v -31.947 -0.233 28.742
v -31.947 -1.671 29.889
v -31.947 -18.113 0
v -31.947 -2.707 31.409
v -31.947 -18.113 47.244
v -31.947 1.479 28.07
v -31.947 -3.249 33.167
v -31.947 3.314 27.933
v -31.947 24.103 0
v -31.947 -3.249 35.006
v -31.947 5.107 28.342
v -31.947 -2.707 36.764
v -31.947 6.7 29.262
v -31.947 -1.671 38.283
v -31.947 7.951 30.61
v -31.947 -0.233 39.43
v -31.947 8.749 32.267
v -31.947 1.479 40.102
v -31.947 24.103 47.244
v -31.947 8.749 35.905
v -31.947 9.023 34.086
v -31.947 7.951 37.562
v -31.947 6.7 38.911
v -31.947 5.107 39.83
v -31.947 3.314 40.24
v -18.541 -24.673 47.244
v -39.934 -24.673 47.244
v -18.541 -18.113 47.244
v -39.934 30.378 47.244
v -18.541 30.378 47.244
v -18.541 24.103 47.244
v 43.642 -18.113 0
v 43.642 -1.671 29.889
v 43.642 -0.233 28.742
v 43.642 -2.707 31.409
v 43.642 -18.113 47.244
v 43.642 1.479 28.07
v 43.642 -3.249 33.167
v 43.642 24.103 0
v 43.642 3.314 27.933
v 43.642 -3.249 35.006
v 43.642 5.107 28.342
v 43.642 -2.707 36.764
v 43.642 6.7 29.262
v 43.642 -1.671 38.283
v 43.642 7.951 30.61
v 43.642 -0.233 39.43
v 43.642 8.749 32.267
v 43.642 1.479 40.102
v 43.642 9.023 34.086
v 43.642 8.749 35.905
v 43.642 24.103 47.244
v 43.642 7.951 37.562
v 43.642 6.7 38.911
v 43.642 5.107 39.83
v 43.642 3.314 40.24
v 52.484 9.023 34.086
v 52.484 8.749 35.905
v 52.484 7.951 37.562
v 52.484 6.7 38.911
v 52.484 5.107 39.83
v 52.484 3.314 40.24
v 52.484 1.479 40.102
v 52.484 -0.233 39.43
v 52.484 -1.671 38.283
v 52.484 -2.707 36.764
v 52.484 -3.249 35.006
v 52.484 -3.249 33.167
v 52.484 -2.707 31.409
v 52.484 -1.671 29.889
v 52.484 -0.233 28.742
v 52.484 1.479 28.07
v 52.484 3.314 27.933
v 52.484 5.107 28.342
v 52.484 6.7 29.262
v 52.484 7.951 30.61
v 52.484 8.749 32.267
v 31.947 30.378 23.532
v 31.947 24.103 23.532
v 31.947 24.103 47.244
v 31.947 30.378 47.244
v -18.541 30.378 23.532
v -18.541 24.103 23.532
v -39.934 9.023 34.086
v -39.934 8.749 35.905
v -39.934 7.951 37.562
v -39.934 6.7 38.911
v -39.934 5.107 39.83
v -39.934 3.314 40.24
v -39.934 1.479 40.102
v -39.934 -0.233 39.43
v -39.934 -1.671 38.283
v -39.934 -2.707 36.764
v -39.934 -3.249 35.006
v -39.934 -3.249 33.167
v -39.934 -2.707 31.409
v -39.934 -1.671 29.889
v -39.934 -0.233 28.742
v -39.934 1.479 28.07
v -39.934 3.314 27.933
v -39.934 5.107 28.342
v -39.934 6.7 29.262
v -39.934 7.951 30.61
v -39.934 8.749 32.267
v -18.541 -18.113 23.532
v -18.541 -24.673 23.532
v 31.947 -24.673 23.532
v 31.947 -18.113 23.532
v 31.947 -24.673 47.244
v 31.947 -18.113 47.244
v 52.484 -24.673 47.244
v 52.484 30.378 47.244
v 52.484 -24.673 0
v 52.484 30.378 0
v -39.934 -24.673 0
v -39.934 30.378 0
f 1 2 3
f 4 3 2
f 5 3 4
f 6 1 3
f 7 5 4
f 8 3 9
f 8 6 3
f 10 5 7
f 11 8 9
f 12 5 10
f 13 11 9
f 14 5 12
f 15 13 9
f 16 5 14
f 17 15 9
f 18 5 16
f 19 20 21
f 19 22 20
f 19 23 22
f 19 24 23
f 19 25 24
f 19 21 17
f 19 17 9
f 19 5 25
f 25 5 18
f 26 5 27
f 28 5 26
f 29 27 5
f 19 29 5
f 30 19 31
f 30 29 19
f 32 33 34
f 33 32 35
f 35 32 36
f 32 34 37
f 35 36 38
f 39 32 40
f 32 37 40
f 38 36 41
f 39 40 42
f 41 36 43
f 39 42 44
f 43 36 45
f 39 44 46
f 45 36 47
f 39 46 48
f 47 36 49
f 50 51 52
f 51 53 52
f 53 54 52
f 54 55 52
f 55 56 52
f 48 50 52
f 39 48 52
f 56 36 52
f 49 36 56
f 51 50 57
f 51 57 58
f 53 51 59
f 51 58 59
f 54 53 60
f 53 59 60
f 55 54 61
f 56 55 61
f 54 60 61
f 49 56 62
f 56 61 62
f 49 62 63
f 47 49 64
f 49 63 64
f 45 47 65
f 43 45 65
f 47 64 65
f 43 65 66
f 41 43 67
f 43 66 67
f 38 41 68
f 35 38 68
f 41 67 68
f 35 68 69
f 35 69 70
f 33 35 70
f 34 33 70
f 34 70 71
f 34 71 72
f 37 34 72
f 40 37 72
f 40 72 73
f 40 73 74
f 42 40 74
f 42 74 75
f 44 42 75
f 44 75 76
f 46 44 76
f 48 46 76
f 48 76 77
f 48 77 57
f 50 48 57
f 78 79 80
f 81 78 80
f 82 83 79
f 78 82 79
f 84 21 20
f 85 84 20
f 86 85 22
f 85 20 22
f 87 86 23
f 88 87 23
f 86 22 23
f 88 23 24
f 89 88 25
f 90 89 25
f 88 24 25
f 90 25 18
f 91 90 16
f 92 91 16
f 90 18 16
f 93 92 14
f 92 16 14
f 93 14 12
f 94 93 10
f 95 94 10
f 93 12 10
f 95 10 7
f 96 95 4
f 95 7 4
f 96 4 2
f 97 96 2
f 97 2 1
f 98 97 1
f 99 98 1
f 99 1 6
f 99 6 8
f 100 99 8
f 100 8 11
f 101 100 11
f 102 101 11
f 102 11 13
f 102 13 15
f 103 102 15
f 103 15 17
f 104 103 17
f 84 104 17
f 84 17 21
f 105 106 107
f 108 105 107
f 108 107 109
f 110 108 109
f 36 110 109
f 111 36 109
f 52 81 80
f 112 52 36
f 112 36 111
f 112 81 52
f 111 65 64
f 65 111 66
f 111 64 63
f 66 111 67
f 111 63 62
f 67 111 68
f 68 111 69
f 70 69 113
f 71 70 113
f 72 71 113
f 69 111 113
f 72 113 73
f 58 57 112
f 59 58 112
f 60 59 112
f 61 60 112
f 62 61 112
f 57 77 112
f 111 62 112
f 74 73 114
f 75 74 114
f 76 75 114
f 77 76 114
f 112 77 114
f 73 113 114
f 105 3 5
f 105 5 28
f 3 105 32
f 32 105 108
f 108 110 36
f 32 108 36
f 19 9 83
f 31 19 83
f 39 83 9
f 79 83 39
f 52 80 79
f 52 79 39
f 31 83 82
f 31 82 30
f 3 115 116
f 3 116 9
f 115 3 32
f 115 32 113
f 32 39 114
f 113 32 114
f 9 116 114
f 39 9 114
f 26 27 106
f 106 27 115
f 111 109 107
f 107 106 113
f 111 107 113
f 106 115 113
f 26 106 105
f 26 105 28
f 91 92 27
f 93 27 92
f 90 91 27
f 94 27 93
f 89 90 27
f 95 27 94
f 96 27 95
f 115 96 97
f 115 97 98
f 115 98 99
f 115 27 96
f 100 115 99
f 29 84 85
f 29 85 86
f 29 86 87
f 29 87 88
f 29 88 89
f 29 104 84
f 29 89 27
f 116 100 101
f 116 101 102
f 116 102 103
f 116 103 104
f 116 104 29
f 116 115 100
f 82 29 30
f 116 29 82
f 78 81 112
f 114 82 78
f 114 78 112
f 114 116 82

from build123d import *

# Parameters (mm, degrees)
F0_W     = 92.417967
F0_H     = 55.051444
F1_DEPTH = 47.244
F2_W     = 75.588774
F2_H     = 42.215616
F3_DEPTH = 47.245
F4_W     = 50.487596
F4_H     = 23.711647
F5_DEPTH = 55.052444
F6_R     = 6.170698
F7_DEPTH = 92.418967


with BuildPart() as f1:
    # F0 (on Top) → F1 (new body)
    with BuildSketch(Plane.XY):
        with Locations((6.275294, 2.852407)):
            Rectangle(F0_W, F0_H)
    extrude(amount=F1_DEPTH)

    # F2 (on face) → F3 (cut, through all)
    with BuildSketch(Plane.XY.offset(47.244)):
        with Locations((5.847434, 2.995027)):
            Rectangle(F2_W, F2_H)
    extrude(amount=-F3_DEPTH, mode=Mode.SUBTRACT)

    # F4 (on face) → F5 (cut, through all)
    with BuildSketch(Plane.XZ.offset(24.673315)):
        with Locations((6.703155, 35.388177)):
            Rectangle(F4_W, F4_H)
    extrude(amount=-F5_DEPTH, mode=Mode.SUBTRACT)

    # F6 (on face) → F7 (cut, through all)
    with BuildSketch(Plane.YZ.offset(52.484278)):
        with Locations((2.852408, 34.086257)):
            Circle(F6_R)
    extrude(amount=-F7_DEPTH, mode=Mode.SUBTRACT)


solid = f1.part
